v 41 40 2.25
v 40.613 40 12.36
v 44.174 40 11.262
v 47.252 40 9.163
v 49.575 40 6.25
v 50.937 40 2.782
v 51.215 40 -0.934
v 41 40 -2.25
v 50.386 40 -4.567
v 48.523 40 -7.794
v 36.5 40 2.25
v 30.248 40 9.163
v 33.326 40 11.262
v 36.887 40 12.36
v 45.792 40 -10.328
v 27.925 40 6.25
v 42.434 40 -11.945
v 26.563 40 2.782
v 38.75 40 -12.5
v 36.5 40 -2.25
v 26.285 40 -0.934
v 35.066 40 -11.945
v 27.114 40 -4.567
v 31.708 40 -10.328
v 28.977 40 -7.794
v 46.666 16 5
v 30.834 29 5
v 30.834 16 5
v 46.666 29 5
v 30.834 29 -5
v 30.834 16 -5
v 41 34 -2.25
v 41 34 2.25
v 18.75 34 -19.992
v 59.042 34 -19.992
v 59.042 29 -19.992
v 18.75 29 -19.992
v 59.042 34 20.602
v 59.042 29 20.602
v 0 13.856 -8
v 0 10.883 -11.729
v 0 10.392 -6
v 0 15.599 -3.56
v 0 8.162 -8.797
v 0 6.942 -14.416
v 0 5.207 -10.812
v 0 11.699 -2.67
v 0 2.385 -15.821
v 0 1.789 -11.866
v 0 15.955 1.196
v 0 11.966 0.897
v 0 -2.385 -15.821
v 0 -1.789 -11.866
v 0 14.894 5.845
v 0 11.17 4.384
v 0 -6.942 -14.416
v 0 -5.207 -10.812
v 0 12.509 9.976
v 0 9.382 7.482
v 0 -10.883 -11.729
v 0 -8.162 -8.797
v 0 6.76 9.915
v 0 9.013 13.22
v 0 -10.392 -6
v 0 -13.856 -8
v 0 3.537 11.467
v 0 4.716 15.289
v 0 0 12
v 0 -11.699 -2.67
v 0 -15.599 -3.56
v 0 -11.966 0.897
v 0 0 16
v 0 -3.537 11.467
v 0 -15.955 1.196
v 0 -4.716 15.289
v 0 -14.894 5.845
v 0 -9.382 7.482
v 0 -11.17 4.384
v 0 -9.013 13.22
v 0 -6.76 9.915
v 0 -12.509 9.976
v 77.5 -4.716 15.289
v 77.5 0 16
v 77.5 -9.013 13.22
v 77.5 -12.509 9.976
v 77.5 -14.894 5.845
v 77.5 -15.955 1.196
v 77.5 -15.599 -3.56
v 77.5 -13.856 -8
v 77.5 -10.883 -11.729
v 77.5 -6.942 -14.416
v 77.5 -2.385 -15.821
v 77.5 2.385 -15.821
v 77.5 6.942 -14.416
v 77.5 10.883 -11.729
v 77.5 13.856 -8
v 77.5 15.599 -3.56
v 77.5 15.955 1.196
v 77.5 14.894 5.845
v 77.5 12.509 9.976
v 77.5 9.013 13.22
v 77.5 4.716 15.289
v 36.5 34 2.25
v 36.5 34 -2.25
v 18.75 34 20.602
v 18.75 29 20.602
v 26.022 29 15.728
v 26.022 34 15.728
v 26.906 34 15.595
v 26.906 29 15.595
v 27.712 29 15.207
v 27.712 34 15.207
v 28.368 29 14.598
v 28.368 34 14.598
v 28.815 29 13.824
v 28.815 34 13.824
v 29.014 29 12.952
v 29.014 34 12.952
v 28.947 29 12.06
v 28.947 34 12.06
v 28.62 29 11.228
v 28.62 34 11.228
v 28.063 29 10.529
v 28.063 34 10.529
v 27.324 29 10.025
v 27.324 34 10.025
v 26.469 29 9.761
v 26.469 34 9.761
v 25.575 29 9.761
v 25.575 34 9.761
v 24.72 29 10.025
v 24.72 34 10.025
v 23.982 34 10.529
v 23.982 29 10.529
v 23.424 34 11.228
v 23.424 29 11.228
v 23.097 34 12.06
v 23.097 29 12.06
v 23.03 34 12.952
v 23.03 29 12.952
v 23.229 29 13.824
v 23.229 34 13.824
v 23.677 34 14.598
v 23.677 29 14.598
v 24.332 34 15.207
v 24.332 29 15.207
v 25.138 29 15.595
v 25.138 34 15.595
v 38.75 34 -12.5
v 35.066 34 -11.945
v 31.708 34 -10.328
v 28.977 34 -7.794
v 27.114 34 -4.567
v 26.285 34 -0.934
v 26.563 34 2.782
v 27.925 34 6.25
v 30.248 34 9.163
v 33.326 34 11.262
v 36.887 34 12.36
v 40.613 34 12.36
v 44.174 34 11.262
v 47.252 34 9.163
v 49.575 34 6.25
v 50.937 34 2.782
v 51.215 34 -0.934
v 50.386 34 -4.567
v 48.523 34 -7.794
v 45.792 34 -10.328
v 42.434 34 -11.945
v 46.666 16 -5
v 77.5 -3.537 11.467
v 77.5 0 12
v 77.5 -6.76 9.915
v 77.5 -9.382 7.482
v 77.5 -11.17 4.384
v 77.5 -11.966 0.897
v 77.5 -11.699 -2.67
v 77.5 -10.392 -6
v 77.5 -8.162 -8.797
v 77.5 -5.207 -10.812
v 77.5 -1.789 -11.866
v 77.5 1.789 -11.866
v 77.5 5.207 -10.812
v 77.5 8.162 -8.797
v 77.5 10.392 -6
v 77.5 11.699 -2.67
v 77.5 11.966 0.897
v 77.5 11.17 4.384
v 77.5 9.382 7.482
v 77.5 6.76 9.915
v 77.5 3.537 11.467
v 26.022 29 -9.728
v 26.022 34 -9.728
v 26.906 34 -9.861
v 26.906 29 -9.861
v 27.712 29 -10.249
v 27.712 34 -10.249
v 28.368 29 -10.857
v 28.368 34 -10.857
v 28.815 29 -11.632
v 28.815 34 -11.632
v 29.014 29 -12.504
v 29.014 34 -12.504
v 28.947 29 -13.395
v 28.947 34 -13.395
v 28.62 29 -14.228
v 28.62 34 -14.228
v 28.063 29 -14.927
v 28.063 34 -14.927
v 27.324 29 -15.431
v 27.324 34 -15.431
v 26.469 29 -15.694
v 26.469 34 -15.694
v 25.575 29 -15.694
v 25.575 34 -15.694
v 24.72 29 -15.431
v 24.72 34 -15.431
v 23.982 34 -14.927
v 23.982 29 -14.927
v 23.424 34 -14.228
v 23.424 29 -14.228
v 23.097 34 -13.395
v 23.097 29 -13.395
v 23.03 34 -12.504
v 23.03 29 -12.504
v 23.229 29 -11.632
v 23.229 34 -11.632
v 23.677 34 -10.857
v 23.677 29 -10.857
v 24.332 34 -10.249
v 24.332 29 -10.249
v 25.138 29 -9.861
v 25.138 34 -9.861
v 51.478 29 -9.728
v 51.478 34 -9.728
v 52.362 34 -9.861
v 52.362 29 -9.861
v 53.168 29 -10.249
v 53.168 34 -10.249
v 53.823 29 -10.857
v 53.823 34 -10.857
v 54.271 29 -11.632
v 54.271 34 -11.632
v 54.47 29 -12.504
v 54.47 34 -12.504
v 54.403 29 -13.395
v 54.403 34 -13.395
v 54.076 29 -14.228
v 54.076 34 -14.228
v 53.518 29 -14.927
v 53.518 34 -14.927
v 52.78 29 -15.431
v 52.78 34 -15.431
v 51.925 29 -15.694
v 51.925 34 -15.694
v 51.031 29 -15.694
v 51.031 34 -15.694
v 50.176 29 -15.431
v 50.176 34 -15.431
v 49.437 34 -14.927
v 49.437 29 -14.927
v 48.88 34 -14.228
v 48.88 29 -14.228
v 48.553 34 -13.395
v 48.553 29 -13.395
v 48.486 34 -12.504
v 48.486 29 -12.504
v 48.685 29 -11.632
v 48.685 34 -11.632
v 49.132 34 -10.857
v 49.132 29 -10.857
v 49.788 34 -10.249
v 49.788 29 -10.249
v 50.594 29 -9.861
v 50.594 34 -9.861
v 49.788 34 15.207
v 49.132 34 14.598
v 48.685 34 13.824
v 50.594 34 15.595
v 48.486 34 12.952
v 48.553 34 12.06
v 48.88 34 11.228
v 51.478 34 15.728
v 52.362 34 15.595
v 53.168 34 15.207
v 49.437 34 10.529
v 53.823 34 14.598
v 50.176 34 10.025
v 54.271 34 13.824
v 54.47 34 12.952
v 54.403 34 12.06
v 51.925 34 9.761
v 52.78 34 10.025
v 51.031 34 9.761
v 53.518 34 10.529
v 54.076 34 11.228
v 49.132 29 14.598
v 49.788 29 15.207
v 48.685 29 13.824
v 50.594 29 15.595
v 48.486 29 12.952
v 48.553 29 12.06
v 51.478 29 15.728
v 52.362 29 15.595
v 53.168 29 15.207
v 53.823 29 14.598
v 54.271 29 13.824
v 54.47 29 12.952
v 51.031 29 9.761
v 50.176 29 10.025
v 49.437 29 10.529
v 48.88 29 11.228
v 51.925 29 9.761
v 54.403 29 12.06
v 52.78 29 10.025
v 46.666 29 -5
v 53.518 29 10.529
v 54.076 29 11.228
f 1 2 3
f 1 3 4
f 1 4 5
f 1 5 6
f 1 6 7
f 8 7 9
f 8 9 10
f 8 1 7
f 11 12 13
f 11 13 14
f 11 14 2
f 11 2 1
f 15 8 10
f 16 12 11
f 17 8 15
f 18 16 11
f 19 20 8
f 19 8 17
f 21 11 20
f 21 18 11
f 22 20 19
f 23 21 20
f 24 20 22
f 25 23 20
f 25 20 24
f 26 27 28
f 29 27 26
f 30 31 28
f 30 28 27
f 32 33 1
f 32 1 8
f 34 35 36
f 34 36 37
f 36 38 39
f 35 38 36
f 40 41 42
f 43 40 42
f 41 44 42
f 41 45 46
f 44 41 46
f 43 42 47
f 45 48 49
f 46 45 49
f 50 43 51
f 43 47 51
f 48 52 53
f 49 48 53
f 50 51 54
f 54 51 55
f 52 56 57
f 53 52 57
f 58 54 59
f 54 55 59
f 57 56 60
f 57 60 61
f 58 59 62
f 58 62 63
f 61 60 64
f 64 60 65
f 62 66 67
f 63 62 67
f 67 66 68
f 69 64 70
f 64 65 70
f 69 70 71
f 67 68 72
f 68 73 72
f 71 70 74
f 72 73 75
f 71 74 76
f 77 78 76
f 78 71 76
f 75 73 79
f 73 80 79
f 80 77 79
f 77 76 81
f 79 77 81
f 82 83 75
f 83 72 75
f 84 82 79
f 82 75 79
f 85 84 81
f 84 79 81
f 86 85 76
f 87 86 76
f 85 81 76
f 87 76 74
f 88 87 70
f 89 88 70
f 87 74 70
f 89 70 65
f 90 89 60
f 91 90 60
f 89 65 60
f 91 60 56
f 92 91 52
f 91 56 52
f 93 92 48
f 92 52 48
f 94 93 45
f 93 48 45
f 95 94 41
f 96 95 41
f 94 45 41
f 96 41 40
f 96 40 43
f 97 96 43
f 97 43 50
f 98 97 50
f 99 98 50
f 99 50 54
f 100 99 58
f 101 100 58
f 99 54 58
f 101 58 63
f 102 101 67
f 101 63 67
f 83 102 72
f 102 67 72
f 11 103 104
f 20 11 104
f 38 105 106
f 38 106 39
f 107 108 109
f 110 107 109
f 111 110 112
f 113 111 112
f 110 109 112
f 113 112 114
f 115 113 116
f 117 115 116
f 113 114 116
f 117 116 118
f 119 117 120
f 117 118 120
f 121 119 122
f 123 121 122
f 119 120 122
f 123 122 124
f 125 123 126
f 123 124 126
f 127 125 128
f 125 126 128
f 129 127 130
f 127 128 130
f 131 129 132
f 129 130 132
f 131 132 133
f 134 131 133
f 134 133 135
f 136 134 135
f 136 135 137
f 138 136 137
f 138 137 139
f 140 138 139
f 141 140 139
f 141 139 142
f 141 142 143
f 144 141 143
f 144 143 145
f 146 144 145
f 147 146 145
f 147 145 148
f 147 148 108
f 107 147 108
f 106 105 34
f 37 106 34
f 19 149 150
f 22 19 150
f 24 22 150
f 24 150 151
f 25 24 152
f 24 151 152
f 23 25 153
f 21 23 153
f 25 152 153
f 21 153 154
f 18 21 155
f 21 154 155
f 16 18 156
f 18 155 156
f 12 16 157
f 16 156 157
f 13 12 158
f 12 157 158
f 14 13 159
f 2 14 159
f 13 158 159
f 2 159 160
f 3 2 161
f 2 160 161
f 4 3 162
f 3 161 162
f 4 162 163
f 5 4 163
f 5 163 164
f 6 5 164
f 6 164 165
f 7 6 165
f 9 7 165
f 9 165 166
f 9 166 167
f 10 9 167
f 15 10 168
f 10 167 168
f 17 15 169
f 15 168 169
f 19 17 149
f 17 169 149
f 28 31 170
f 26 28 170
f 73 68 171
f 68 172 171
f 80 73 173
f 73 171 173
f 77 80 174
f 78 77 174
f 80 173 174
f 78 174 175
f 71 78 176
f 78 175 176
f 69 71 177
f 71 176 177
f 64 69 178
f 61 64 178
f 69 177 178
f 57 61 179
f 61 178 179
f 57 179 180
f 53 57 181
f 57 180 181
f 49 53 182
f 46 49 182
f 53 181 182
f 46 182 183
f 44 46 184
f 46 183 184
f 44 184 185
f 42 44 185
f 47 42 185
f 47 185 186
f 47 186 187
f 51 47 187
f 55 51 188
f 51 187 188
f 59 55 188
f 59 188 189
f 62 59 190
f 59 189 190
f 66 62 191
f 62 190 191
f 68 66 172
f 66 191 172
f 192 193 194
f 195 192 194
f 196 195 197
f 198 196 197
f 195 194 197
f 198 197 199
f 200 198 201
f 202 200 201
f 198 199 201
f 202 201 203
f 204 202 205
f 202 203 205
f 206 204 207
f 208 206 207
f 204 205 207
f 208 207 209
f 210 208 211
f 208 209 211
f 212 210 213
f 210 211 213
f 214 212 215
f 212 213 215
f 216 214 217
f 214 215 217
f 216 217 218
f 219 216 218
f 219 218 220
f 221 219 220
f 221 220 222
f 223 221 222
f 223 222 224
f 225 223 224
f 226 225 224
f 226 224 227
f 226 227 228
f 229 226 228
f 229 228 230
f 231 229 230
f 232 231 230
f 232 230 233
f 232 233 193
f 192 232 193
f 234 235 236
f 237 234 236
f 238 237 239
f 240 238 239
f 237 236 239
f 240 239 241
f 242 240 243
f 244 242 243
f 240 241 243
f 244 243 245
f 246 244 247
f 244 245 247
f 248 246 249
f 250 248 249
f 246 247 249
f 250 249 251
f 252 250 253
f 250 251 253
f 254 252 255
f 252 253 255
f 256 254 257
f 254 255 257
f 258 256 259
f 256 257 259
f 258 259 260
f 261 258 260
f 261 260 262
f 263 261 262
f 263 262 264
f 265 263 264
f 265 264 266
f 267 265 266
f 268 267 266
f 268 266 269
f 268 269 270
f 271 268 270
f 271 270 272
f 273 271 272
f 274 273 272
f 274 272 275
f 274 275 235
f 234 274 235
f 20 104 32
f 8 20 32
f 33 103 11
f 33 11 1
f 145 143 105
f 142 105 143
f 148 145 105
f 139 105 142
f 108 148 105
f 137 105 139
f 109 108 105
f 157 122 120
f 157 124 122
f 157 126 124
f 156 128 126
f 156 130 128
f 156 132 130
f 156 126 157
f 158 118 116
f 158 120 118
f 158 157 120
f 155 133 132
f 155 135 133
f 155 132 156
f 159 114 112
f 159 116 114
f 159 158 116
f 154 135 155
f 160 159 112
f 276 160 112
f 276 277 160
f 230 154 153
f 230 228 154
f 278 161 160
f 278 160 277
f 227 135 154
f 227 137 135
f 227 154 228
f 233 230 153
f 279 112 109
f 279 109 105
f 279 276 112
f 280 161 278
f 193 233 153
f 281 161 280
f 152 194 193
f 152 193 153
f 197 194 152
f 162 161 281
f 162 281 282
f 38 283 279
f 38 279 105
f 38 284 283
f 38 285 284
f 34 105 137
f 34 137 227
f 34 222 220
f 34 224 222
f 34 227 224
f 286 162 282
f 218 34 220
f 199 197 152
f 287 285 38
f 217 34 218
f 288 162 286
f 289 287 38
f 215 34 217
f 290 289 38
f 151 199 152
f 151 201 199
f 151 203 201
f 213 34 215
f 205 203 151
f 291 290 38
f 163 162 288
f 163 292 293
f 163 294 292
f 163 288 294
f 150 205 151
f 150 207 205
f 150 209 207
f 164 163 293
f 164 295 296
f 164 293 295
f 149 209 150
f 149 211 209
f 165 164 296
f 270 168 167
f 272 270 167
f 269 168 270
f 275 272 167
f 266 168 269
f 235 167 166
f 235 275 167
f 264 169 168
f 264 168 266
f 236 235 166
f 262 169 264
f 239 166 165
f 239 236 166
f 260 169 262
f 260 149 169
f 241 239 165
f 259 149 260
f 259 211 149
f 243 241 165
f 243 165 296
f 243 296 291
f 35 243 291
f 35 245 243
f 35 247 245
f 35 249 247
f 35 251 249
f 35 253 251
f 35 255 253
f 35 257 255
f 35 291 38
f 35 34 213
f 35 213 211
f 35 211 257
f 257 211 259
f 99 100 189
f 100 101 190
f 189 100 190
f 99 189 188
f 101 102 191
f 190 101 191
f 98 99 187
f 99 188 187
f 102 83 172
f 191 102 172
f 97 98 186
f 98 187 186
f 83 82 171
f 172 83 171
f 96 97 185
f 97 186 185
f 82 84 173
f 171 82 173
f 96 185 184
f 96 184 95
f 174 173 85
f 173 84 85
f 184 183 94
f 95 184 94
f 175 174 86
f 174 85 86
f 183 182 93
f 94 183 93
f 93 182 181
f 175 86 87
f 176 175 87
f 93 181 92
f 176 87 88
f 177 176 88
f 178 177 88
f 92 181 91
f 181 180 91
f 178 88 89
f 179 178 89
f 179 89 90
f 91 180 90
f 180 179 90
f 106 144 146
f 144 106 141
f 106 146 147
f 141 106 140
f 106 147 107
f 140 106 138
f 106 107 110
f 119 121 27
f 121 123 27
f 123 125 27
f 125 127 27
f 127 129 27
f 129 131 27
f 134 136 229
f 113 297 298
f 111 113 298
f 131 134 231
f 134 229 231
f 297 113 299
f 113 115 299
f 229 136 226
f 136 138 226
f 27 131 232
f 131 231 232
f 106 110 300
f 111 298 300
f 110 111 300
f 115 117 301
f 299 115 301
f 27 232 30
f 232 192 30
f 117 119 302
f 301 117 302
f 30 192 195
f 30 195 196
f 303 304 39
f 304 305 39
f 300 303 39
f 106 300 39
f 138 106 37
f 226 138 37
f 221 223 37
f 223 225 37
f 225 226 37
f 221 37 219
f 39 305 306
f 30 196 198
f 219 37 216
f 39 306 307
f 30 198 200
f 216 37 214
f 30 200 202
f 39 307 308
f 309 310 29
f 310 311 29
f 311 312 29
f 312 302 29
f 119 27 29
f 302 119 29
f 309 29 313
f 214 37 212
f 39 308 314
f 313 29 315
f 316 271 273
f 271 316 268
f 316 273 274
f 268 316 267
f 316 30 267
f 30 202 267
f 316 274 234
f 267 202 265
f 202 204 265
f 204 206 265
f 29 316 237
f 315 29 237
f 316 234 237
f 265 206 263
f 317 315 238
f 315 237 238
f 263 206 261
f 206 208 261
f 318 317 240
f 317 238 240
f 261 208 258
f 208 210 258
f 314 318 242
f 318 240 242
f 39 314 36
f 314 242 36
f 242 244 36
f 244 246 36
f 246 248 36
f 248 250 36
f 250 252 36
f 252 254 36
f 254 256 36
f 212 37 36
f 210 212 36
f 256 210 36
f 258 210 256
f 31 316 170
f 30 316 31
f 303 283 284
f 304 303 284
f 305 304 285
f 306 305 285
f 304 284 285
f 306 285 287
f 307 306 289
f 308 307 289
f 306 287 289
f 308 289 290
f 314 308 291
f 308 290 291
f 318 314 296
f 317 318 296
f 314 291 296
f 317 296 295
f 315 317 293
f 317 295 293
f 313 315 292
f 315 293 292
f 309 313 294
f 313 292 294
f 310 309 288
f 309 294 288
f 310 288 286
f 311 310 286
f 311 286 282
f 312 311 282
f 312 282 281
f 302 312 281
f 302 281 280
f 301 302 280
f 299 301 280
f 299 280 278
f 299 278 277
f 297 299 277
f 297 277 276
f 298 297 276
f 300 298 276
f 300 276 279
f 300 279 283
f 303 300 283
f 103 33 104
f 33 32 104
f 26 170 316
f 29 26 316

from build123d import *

# Parameters (mm, degrees)
DODANIE_WYCI_GNI_CIE1_DEPTH      = 16
DODANIE_WYCI_GNI_CIE1_DEPTH_BACK = 16
SZKIC2_R                         = 3
WYTNIJ_WYCI_GNI_CIE1_DEPTH       = 15
DODANIE_WYCI_GNI_CIE2_DEPTH      = 6
SZKIC5_W                         = 15.832735356
SZKIC5_H                         = 13
WYTNIJ_WYCI_GNI_CIE2_DEPTH       = 11
SZKIC6_W                         = 15.832735356
SZKIC6_H                         = 13
WYTNIJ_WYCI_GNI_CIE3_DEPTH       = 11
SZKIC7_W                         = 40.29170114
SZKIC7_H                         = 40.594635428
SZKIC7_W_2                       = 32
SZKIC7_H_2                       = 32
DODANIE_WYCI_GNI_CIE3_DEPTH      = 5


with BuildPart() as part:
    # Szkic1 → Dodanie-wyciągnięcie1 (new, two sides: drawn at the far end of the back side and taken through both)
    with BuildSketch(Plane.XY.offset(-DODANIE_WYCI_GNI_CIE1_DEPTH_BACK)):
        Polygon((30.833632322, 16), (46.666367678, 16), (46.666367678, 29), (54.75, 29), (54.75, 34), (22.75, 34), (22.75, 29), (30.833632322, 29), align=None)
    extrude(amount=DODANIE_WYCI_GNI_CIE1_DEPTH + DODANIE_WYCI_GNI_CIE1_DEPTH_BACK)

    # Szkic2 → Wytnij-wyciągnięcie1 (cut)
    with BuildSketch(Plane(origin=(0, 34, 0), x_dir=(1, 0, 0), z_dir=(0, 1, 0))):
        with Locations((51.477922061, 12.727922061)):
            Circle(SZKIC2_R)
        with Locations((26.022077939, 12.727922061)):
            Circle(SZKIC2_R)
        with Locations((51.477922061, -12.727922061)):
            Circle(SZKIC2_R)
        with Locations((26.022077939, -12.727922061)):
            Circle(SZKIC2_R)
    extrude(amount=-WYTNIJ_WYCI_GNI_CIE1_DEPTH, mode=Mode.SUBTRACT)

    # Szkic3 → Dodanie-wyciągnięcie2 (add)
    with BuildSketch(Plane(origin=(0, 34, 0), x_dir=(1, 0, 0), z_dir=(0, 1, 0))):
        with BuildLine():
            ThreePointArc((51.25, 0), (47.588834765, 8.838834765), (38.75, 12.5))
            ThreePointArc((38.75, 12.5), (29.911165235, -8.838834765), (51.25, 0))
        make_face()
        Polygon((36.500021314, 2.249743185), (38.75, 2.249743185), (40.999978686, 2.249743185), (40.999978686, -2.249743185), (36.500021314, -2.249743185), align=None, mode=Mode.SUBTRACT)
    extrude(amount=DODANIE_WYCI_GNI_CIE2_DEPTH)

    # Szkic5 → Wytnij-wyciągnięcie2 (cut)
    with BuildSketch(Plane.XY.offset(16)):
        with Locations((38.75, 22.5)):
            Rectangle(SZKIC5_W, SZKIC5_H)
    extrude(amount=-WYTNIJ_WYCI_GNI_CIE2_DEPTH, mode=Mode.SUBTRACT)

    # Szkic6 → Wytnij-wyciągnięcie3 (cut)
    with BuildSketch(Plane(origin=(0, 0, -16), x_dir=(-1, 0, 0), z_dir=(0, 0, -1))):
        with Locations((-38.75, 22.5)):
            Rectangle(SZKIC6_W, SZKIC6_H)
    extrude(amount=-WYTNIJ_WYCI_GNI_CIE3_DEPTH, mode=Mode.SUBTRACT)

    # Szkic7 → Dodanie-wyciągnięcie3 (add)
    with BuildSketch(Plane(origin=(0, 34, 0), x_dir=(1, 0, 0), z_dir=(0, 1, 0))):
        with Locations((38.89571093, -0.304852178)):
            Rectangle(SZKIC7_W, SZKIC7_H)
        with Locations((38.75, 0)):
            Rectangle(SZKIC7_W_2, SZKIC7_H_2, mode=Mode.SUBTRACT)
    extrude(amount=-DODANIE_WYCI_GNI_CIE3_DEPTH)


with BuildPart() as body_2:
    # Szkic4 → Obrót2 (revolve)
    with BuildSketch(Plane.XY):
        Polygon((0, 16), (0, 12), (77.5, 12), (77.5, 16), (46.666367678, 16), (30.833632322, 16), align=None)
    revolve(axis=Axis((0, 0, 0), (1, 0, 0)))


solid = Compound([part.part, body_2.part])
